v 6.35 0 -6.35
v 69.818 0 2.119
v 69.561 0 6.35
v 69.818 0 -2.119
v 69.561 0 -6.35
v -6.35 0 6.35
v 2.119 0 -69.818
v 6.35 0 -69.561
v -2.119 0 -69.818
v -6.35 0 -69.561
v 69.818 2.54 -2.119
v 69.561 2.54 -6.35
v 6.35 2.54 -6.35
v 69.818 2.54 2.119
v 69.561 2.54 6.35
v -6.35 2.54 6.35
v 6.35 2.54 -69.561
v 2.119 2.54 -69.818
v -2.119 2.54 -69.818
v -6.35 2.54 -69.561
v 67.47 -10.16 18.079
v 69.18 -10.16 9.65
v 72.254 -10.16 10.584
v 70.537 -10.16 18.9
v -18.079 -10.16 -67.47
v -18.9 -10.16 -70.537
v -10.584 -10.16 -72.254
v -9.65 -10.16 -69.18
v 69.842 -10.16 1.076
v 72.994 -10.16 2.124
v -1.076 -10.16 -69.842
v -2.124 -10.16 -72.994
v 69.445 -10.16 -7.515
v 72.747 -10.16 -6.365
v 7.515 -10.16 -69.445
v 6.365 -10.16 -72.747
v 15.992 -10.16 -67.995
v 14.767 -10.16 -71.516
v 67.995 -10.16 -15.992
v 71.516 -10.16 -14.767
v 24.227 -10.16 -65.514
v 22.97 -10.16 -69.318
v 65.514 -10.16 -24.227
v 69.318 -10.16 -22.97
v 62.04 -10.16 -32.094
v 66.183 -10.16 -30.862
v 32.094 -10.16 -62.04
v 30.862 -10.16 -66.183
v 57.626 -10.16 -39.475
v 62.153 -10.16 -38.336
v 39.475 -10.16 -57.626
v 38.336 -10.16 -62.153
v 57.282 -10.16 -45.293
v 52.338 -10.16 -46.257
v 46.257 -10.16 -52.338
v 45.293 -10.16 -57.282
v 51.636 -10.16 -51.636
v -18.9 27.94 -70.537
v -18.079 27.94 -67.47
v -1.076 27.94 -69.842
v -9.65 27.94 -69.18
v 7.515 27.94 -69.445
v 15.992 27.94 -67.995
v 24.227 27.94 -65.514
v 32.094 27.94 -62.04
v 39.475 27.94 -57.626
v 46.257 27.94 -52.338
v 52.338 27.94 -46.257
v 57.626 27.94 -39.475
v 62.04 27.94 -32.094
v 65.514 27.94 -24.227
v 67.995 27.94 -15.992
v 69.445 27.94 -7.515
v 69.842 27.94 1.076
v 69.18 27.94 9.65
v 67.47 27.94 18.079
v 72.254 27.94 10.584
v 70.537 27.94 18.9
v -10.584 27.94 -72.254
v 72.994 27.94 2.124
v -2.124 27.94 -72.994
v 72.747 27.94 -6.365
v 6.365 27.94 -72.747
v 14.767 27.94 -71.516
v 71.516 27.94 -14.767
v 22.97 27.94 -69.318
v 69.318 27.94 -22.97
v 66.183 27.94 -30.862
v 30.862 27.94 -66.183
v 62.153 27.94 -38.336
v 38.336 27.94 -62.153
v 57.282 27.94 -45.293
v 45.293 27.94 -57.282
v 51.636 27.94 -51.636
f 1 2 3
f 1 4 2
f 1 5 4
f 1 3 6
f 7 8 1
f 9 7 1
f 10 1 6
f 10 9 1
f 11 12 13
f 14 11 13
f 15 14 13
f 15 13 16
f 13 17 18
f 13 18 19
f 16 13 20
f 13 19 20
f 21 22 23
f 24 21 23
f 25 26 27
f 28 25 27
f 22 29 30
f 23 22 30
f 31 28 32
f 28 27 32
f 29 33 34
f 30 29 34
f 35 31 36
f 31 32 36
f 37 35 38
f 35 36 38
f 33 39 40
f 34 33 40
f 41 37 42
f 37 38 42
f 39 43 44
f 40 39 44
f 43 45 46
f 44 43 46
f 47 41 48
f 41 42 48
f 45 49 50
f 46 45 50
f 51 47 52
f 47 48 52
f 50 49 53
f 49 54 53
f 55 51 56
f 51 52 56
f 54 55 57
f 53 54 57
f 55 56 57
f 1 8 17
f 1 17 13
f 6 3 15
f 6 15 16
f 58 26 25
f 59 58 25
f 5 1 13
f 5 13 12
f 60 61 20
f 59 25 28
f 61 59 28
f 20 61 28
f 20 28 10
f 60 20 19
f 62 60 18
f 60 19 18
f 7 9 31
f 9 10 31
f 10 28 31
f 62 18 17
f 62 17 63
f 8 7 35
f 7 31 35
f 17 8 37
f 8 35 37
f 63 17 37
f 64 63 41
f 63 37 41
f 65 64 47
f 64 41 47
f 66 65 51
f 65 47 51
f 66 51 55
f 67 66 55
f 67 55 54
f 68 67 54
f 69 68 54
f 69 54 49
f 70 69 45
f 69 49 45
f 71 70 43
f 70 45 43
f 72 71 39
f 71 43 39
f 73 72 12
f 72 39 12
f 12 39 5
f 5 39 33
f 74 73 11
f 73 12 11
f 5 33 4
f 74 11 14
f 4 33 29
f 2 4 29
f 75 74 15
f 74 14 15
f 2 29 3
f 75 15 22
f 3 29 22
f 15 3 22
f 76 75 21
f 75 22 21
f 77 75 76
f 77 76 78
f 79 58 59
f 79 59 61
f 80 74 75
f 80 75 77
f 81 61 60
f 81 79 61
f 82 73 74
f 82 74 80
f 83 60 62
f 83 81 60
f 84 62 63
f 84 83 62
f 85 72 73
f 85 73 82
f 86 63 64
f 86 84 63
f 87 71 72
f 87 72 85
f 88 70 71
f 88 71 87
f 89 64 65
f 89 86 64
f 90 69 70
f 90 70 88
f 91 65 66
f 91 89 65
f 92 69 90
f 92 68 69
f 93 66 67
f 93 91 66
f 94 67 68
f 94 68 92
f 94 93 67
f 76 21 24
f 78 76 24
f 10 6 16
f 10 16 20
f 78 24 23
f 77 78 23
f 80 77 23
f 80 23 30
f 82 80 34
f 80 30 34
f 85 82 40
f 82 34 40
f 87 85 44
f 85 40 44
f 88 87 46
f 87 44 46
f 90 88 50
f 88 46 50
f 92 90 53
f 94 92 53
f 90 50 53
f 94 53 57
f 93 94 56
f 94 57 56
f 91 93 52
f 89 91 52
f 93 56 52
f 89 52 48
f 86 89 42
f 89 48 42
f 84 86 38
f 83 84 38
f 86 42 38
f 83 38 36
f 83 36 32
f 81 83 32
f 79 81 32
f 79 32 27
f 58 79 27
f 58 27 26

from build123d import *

# Parameters (mm, degrees)
BOSS_EXTRUDE1_DEPTH      = 2.54
BOSS_EXTRUDE4_DEPTH      = 25.4
BOSS_EXTRUDE4_DEPTH_BACK = 12.7


with BuildPart() as part:
    # Sketch1 → Boss-Extrude1 (new body)
    with BuildSketch(Plane(origin=(0, 0, 0), x_dir=(1, 0, 0), z_dir=(0, 1, 0))):
        Polygon((-6.35, 69.85), (-6.35, -6.35), (69.85, -6.35), (69.85, 6.35), (6.35, 6.35), (6.35, 69.85), align=None)
    extrude(amount=BOSS_EXTRUDE1_DEPTH)

    # Sketch2 → Boss-Extrude4 (add, two sides: drawn at the far end of the back side and taken through both)
    with BuildSketch(Plane(origin=(0, 2.54, 0), x_dir=(1, 0, 0), z_dir=(0, 1, 0)).offset(-BOSS_EXTRUDE4_DEPTH_BACK)):
        with BuildLine():
            Line((-18.900260769, 70.536733465), (-18.0785103, 67.469918966))
            ThreePointArc((-18.0785103, 67.469918966), (49.391408666, 49.391408666), (67.469918966, -18.0785103))
            Line((67.469918966, -18.0785103), (70.536733465, -18.900260769))
            ThreePointArc((70.536733465, -18.900260769), (51.636472696, 51.636472696), (-18.900260769, 70.536733465))
        make_face()
    extrude(amount=BOSS_EXTRUDE4_DEPTH + BOSS_EXTRUDE4_DEPTH_BACK)


solid = part.part
